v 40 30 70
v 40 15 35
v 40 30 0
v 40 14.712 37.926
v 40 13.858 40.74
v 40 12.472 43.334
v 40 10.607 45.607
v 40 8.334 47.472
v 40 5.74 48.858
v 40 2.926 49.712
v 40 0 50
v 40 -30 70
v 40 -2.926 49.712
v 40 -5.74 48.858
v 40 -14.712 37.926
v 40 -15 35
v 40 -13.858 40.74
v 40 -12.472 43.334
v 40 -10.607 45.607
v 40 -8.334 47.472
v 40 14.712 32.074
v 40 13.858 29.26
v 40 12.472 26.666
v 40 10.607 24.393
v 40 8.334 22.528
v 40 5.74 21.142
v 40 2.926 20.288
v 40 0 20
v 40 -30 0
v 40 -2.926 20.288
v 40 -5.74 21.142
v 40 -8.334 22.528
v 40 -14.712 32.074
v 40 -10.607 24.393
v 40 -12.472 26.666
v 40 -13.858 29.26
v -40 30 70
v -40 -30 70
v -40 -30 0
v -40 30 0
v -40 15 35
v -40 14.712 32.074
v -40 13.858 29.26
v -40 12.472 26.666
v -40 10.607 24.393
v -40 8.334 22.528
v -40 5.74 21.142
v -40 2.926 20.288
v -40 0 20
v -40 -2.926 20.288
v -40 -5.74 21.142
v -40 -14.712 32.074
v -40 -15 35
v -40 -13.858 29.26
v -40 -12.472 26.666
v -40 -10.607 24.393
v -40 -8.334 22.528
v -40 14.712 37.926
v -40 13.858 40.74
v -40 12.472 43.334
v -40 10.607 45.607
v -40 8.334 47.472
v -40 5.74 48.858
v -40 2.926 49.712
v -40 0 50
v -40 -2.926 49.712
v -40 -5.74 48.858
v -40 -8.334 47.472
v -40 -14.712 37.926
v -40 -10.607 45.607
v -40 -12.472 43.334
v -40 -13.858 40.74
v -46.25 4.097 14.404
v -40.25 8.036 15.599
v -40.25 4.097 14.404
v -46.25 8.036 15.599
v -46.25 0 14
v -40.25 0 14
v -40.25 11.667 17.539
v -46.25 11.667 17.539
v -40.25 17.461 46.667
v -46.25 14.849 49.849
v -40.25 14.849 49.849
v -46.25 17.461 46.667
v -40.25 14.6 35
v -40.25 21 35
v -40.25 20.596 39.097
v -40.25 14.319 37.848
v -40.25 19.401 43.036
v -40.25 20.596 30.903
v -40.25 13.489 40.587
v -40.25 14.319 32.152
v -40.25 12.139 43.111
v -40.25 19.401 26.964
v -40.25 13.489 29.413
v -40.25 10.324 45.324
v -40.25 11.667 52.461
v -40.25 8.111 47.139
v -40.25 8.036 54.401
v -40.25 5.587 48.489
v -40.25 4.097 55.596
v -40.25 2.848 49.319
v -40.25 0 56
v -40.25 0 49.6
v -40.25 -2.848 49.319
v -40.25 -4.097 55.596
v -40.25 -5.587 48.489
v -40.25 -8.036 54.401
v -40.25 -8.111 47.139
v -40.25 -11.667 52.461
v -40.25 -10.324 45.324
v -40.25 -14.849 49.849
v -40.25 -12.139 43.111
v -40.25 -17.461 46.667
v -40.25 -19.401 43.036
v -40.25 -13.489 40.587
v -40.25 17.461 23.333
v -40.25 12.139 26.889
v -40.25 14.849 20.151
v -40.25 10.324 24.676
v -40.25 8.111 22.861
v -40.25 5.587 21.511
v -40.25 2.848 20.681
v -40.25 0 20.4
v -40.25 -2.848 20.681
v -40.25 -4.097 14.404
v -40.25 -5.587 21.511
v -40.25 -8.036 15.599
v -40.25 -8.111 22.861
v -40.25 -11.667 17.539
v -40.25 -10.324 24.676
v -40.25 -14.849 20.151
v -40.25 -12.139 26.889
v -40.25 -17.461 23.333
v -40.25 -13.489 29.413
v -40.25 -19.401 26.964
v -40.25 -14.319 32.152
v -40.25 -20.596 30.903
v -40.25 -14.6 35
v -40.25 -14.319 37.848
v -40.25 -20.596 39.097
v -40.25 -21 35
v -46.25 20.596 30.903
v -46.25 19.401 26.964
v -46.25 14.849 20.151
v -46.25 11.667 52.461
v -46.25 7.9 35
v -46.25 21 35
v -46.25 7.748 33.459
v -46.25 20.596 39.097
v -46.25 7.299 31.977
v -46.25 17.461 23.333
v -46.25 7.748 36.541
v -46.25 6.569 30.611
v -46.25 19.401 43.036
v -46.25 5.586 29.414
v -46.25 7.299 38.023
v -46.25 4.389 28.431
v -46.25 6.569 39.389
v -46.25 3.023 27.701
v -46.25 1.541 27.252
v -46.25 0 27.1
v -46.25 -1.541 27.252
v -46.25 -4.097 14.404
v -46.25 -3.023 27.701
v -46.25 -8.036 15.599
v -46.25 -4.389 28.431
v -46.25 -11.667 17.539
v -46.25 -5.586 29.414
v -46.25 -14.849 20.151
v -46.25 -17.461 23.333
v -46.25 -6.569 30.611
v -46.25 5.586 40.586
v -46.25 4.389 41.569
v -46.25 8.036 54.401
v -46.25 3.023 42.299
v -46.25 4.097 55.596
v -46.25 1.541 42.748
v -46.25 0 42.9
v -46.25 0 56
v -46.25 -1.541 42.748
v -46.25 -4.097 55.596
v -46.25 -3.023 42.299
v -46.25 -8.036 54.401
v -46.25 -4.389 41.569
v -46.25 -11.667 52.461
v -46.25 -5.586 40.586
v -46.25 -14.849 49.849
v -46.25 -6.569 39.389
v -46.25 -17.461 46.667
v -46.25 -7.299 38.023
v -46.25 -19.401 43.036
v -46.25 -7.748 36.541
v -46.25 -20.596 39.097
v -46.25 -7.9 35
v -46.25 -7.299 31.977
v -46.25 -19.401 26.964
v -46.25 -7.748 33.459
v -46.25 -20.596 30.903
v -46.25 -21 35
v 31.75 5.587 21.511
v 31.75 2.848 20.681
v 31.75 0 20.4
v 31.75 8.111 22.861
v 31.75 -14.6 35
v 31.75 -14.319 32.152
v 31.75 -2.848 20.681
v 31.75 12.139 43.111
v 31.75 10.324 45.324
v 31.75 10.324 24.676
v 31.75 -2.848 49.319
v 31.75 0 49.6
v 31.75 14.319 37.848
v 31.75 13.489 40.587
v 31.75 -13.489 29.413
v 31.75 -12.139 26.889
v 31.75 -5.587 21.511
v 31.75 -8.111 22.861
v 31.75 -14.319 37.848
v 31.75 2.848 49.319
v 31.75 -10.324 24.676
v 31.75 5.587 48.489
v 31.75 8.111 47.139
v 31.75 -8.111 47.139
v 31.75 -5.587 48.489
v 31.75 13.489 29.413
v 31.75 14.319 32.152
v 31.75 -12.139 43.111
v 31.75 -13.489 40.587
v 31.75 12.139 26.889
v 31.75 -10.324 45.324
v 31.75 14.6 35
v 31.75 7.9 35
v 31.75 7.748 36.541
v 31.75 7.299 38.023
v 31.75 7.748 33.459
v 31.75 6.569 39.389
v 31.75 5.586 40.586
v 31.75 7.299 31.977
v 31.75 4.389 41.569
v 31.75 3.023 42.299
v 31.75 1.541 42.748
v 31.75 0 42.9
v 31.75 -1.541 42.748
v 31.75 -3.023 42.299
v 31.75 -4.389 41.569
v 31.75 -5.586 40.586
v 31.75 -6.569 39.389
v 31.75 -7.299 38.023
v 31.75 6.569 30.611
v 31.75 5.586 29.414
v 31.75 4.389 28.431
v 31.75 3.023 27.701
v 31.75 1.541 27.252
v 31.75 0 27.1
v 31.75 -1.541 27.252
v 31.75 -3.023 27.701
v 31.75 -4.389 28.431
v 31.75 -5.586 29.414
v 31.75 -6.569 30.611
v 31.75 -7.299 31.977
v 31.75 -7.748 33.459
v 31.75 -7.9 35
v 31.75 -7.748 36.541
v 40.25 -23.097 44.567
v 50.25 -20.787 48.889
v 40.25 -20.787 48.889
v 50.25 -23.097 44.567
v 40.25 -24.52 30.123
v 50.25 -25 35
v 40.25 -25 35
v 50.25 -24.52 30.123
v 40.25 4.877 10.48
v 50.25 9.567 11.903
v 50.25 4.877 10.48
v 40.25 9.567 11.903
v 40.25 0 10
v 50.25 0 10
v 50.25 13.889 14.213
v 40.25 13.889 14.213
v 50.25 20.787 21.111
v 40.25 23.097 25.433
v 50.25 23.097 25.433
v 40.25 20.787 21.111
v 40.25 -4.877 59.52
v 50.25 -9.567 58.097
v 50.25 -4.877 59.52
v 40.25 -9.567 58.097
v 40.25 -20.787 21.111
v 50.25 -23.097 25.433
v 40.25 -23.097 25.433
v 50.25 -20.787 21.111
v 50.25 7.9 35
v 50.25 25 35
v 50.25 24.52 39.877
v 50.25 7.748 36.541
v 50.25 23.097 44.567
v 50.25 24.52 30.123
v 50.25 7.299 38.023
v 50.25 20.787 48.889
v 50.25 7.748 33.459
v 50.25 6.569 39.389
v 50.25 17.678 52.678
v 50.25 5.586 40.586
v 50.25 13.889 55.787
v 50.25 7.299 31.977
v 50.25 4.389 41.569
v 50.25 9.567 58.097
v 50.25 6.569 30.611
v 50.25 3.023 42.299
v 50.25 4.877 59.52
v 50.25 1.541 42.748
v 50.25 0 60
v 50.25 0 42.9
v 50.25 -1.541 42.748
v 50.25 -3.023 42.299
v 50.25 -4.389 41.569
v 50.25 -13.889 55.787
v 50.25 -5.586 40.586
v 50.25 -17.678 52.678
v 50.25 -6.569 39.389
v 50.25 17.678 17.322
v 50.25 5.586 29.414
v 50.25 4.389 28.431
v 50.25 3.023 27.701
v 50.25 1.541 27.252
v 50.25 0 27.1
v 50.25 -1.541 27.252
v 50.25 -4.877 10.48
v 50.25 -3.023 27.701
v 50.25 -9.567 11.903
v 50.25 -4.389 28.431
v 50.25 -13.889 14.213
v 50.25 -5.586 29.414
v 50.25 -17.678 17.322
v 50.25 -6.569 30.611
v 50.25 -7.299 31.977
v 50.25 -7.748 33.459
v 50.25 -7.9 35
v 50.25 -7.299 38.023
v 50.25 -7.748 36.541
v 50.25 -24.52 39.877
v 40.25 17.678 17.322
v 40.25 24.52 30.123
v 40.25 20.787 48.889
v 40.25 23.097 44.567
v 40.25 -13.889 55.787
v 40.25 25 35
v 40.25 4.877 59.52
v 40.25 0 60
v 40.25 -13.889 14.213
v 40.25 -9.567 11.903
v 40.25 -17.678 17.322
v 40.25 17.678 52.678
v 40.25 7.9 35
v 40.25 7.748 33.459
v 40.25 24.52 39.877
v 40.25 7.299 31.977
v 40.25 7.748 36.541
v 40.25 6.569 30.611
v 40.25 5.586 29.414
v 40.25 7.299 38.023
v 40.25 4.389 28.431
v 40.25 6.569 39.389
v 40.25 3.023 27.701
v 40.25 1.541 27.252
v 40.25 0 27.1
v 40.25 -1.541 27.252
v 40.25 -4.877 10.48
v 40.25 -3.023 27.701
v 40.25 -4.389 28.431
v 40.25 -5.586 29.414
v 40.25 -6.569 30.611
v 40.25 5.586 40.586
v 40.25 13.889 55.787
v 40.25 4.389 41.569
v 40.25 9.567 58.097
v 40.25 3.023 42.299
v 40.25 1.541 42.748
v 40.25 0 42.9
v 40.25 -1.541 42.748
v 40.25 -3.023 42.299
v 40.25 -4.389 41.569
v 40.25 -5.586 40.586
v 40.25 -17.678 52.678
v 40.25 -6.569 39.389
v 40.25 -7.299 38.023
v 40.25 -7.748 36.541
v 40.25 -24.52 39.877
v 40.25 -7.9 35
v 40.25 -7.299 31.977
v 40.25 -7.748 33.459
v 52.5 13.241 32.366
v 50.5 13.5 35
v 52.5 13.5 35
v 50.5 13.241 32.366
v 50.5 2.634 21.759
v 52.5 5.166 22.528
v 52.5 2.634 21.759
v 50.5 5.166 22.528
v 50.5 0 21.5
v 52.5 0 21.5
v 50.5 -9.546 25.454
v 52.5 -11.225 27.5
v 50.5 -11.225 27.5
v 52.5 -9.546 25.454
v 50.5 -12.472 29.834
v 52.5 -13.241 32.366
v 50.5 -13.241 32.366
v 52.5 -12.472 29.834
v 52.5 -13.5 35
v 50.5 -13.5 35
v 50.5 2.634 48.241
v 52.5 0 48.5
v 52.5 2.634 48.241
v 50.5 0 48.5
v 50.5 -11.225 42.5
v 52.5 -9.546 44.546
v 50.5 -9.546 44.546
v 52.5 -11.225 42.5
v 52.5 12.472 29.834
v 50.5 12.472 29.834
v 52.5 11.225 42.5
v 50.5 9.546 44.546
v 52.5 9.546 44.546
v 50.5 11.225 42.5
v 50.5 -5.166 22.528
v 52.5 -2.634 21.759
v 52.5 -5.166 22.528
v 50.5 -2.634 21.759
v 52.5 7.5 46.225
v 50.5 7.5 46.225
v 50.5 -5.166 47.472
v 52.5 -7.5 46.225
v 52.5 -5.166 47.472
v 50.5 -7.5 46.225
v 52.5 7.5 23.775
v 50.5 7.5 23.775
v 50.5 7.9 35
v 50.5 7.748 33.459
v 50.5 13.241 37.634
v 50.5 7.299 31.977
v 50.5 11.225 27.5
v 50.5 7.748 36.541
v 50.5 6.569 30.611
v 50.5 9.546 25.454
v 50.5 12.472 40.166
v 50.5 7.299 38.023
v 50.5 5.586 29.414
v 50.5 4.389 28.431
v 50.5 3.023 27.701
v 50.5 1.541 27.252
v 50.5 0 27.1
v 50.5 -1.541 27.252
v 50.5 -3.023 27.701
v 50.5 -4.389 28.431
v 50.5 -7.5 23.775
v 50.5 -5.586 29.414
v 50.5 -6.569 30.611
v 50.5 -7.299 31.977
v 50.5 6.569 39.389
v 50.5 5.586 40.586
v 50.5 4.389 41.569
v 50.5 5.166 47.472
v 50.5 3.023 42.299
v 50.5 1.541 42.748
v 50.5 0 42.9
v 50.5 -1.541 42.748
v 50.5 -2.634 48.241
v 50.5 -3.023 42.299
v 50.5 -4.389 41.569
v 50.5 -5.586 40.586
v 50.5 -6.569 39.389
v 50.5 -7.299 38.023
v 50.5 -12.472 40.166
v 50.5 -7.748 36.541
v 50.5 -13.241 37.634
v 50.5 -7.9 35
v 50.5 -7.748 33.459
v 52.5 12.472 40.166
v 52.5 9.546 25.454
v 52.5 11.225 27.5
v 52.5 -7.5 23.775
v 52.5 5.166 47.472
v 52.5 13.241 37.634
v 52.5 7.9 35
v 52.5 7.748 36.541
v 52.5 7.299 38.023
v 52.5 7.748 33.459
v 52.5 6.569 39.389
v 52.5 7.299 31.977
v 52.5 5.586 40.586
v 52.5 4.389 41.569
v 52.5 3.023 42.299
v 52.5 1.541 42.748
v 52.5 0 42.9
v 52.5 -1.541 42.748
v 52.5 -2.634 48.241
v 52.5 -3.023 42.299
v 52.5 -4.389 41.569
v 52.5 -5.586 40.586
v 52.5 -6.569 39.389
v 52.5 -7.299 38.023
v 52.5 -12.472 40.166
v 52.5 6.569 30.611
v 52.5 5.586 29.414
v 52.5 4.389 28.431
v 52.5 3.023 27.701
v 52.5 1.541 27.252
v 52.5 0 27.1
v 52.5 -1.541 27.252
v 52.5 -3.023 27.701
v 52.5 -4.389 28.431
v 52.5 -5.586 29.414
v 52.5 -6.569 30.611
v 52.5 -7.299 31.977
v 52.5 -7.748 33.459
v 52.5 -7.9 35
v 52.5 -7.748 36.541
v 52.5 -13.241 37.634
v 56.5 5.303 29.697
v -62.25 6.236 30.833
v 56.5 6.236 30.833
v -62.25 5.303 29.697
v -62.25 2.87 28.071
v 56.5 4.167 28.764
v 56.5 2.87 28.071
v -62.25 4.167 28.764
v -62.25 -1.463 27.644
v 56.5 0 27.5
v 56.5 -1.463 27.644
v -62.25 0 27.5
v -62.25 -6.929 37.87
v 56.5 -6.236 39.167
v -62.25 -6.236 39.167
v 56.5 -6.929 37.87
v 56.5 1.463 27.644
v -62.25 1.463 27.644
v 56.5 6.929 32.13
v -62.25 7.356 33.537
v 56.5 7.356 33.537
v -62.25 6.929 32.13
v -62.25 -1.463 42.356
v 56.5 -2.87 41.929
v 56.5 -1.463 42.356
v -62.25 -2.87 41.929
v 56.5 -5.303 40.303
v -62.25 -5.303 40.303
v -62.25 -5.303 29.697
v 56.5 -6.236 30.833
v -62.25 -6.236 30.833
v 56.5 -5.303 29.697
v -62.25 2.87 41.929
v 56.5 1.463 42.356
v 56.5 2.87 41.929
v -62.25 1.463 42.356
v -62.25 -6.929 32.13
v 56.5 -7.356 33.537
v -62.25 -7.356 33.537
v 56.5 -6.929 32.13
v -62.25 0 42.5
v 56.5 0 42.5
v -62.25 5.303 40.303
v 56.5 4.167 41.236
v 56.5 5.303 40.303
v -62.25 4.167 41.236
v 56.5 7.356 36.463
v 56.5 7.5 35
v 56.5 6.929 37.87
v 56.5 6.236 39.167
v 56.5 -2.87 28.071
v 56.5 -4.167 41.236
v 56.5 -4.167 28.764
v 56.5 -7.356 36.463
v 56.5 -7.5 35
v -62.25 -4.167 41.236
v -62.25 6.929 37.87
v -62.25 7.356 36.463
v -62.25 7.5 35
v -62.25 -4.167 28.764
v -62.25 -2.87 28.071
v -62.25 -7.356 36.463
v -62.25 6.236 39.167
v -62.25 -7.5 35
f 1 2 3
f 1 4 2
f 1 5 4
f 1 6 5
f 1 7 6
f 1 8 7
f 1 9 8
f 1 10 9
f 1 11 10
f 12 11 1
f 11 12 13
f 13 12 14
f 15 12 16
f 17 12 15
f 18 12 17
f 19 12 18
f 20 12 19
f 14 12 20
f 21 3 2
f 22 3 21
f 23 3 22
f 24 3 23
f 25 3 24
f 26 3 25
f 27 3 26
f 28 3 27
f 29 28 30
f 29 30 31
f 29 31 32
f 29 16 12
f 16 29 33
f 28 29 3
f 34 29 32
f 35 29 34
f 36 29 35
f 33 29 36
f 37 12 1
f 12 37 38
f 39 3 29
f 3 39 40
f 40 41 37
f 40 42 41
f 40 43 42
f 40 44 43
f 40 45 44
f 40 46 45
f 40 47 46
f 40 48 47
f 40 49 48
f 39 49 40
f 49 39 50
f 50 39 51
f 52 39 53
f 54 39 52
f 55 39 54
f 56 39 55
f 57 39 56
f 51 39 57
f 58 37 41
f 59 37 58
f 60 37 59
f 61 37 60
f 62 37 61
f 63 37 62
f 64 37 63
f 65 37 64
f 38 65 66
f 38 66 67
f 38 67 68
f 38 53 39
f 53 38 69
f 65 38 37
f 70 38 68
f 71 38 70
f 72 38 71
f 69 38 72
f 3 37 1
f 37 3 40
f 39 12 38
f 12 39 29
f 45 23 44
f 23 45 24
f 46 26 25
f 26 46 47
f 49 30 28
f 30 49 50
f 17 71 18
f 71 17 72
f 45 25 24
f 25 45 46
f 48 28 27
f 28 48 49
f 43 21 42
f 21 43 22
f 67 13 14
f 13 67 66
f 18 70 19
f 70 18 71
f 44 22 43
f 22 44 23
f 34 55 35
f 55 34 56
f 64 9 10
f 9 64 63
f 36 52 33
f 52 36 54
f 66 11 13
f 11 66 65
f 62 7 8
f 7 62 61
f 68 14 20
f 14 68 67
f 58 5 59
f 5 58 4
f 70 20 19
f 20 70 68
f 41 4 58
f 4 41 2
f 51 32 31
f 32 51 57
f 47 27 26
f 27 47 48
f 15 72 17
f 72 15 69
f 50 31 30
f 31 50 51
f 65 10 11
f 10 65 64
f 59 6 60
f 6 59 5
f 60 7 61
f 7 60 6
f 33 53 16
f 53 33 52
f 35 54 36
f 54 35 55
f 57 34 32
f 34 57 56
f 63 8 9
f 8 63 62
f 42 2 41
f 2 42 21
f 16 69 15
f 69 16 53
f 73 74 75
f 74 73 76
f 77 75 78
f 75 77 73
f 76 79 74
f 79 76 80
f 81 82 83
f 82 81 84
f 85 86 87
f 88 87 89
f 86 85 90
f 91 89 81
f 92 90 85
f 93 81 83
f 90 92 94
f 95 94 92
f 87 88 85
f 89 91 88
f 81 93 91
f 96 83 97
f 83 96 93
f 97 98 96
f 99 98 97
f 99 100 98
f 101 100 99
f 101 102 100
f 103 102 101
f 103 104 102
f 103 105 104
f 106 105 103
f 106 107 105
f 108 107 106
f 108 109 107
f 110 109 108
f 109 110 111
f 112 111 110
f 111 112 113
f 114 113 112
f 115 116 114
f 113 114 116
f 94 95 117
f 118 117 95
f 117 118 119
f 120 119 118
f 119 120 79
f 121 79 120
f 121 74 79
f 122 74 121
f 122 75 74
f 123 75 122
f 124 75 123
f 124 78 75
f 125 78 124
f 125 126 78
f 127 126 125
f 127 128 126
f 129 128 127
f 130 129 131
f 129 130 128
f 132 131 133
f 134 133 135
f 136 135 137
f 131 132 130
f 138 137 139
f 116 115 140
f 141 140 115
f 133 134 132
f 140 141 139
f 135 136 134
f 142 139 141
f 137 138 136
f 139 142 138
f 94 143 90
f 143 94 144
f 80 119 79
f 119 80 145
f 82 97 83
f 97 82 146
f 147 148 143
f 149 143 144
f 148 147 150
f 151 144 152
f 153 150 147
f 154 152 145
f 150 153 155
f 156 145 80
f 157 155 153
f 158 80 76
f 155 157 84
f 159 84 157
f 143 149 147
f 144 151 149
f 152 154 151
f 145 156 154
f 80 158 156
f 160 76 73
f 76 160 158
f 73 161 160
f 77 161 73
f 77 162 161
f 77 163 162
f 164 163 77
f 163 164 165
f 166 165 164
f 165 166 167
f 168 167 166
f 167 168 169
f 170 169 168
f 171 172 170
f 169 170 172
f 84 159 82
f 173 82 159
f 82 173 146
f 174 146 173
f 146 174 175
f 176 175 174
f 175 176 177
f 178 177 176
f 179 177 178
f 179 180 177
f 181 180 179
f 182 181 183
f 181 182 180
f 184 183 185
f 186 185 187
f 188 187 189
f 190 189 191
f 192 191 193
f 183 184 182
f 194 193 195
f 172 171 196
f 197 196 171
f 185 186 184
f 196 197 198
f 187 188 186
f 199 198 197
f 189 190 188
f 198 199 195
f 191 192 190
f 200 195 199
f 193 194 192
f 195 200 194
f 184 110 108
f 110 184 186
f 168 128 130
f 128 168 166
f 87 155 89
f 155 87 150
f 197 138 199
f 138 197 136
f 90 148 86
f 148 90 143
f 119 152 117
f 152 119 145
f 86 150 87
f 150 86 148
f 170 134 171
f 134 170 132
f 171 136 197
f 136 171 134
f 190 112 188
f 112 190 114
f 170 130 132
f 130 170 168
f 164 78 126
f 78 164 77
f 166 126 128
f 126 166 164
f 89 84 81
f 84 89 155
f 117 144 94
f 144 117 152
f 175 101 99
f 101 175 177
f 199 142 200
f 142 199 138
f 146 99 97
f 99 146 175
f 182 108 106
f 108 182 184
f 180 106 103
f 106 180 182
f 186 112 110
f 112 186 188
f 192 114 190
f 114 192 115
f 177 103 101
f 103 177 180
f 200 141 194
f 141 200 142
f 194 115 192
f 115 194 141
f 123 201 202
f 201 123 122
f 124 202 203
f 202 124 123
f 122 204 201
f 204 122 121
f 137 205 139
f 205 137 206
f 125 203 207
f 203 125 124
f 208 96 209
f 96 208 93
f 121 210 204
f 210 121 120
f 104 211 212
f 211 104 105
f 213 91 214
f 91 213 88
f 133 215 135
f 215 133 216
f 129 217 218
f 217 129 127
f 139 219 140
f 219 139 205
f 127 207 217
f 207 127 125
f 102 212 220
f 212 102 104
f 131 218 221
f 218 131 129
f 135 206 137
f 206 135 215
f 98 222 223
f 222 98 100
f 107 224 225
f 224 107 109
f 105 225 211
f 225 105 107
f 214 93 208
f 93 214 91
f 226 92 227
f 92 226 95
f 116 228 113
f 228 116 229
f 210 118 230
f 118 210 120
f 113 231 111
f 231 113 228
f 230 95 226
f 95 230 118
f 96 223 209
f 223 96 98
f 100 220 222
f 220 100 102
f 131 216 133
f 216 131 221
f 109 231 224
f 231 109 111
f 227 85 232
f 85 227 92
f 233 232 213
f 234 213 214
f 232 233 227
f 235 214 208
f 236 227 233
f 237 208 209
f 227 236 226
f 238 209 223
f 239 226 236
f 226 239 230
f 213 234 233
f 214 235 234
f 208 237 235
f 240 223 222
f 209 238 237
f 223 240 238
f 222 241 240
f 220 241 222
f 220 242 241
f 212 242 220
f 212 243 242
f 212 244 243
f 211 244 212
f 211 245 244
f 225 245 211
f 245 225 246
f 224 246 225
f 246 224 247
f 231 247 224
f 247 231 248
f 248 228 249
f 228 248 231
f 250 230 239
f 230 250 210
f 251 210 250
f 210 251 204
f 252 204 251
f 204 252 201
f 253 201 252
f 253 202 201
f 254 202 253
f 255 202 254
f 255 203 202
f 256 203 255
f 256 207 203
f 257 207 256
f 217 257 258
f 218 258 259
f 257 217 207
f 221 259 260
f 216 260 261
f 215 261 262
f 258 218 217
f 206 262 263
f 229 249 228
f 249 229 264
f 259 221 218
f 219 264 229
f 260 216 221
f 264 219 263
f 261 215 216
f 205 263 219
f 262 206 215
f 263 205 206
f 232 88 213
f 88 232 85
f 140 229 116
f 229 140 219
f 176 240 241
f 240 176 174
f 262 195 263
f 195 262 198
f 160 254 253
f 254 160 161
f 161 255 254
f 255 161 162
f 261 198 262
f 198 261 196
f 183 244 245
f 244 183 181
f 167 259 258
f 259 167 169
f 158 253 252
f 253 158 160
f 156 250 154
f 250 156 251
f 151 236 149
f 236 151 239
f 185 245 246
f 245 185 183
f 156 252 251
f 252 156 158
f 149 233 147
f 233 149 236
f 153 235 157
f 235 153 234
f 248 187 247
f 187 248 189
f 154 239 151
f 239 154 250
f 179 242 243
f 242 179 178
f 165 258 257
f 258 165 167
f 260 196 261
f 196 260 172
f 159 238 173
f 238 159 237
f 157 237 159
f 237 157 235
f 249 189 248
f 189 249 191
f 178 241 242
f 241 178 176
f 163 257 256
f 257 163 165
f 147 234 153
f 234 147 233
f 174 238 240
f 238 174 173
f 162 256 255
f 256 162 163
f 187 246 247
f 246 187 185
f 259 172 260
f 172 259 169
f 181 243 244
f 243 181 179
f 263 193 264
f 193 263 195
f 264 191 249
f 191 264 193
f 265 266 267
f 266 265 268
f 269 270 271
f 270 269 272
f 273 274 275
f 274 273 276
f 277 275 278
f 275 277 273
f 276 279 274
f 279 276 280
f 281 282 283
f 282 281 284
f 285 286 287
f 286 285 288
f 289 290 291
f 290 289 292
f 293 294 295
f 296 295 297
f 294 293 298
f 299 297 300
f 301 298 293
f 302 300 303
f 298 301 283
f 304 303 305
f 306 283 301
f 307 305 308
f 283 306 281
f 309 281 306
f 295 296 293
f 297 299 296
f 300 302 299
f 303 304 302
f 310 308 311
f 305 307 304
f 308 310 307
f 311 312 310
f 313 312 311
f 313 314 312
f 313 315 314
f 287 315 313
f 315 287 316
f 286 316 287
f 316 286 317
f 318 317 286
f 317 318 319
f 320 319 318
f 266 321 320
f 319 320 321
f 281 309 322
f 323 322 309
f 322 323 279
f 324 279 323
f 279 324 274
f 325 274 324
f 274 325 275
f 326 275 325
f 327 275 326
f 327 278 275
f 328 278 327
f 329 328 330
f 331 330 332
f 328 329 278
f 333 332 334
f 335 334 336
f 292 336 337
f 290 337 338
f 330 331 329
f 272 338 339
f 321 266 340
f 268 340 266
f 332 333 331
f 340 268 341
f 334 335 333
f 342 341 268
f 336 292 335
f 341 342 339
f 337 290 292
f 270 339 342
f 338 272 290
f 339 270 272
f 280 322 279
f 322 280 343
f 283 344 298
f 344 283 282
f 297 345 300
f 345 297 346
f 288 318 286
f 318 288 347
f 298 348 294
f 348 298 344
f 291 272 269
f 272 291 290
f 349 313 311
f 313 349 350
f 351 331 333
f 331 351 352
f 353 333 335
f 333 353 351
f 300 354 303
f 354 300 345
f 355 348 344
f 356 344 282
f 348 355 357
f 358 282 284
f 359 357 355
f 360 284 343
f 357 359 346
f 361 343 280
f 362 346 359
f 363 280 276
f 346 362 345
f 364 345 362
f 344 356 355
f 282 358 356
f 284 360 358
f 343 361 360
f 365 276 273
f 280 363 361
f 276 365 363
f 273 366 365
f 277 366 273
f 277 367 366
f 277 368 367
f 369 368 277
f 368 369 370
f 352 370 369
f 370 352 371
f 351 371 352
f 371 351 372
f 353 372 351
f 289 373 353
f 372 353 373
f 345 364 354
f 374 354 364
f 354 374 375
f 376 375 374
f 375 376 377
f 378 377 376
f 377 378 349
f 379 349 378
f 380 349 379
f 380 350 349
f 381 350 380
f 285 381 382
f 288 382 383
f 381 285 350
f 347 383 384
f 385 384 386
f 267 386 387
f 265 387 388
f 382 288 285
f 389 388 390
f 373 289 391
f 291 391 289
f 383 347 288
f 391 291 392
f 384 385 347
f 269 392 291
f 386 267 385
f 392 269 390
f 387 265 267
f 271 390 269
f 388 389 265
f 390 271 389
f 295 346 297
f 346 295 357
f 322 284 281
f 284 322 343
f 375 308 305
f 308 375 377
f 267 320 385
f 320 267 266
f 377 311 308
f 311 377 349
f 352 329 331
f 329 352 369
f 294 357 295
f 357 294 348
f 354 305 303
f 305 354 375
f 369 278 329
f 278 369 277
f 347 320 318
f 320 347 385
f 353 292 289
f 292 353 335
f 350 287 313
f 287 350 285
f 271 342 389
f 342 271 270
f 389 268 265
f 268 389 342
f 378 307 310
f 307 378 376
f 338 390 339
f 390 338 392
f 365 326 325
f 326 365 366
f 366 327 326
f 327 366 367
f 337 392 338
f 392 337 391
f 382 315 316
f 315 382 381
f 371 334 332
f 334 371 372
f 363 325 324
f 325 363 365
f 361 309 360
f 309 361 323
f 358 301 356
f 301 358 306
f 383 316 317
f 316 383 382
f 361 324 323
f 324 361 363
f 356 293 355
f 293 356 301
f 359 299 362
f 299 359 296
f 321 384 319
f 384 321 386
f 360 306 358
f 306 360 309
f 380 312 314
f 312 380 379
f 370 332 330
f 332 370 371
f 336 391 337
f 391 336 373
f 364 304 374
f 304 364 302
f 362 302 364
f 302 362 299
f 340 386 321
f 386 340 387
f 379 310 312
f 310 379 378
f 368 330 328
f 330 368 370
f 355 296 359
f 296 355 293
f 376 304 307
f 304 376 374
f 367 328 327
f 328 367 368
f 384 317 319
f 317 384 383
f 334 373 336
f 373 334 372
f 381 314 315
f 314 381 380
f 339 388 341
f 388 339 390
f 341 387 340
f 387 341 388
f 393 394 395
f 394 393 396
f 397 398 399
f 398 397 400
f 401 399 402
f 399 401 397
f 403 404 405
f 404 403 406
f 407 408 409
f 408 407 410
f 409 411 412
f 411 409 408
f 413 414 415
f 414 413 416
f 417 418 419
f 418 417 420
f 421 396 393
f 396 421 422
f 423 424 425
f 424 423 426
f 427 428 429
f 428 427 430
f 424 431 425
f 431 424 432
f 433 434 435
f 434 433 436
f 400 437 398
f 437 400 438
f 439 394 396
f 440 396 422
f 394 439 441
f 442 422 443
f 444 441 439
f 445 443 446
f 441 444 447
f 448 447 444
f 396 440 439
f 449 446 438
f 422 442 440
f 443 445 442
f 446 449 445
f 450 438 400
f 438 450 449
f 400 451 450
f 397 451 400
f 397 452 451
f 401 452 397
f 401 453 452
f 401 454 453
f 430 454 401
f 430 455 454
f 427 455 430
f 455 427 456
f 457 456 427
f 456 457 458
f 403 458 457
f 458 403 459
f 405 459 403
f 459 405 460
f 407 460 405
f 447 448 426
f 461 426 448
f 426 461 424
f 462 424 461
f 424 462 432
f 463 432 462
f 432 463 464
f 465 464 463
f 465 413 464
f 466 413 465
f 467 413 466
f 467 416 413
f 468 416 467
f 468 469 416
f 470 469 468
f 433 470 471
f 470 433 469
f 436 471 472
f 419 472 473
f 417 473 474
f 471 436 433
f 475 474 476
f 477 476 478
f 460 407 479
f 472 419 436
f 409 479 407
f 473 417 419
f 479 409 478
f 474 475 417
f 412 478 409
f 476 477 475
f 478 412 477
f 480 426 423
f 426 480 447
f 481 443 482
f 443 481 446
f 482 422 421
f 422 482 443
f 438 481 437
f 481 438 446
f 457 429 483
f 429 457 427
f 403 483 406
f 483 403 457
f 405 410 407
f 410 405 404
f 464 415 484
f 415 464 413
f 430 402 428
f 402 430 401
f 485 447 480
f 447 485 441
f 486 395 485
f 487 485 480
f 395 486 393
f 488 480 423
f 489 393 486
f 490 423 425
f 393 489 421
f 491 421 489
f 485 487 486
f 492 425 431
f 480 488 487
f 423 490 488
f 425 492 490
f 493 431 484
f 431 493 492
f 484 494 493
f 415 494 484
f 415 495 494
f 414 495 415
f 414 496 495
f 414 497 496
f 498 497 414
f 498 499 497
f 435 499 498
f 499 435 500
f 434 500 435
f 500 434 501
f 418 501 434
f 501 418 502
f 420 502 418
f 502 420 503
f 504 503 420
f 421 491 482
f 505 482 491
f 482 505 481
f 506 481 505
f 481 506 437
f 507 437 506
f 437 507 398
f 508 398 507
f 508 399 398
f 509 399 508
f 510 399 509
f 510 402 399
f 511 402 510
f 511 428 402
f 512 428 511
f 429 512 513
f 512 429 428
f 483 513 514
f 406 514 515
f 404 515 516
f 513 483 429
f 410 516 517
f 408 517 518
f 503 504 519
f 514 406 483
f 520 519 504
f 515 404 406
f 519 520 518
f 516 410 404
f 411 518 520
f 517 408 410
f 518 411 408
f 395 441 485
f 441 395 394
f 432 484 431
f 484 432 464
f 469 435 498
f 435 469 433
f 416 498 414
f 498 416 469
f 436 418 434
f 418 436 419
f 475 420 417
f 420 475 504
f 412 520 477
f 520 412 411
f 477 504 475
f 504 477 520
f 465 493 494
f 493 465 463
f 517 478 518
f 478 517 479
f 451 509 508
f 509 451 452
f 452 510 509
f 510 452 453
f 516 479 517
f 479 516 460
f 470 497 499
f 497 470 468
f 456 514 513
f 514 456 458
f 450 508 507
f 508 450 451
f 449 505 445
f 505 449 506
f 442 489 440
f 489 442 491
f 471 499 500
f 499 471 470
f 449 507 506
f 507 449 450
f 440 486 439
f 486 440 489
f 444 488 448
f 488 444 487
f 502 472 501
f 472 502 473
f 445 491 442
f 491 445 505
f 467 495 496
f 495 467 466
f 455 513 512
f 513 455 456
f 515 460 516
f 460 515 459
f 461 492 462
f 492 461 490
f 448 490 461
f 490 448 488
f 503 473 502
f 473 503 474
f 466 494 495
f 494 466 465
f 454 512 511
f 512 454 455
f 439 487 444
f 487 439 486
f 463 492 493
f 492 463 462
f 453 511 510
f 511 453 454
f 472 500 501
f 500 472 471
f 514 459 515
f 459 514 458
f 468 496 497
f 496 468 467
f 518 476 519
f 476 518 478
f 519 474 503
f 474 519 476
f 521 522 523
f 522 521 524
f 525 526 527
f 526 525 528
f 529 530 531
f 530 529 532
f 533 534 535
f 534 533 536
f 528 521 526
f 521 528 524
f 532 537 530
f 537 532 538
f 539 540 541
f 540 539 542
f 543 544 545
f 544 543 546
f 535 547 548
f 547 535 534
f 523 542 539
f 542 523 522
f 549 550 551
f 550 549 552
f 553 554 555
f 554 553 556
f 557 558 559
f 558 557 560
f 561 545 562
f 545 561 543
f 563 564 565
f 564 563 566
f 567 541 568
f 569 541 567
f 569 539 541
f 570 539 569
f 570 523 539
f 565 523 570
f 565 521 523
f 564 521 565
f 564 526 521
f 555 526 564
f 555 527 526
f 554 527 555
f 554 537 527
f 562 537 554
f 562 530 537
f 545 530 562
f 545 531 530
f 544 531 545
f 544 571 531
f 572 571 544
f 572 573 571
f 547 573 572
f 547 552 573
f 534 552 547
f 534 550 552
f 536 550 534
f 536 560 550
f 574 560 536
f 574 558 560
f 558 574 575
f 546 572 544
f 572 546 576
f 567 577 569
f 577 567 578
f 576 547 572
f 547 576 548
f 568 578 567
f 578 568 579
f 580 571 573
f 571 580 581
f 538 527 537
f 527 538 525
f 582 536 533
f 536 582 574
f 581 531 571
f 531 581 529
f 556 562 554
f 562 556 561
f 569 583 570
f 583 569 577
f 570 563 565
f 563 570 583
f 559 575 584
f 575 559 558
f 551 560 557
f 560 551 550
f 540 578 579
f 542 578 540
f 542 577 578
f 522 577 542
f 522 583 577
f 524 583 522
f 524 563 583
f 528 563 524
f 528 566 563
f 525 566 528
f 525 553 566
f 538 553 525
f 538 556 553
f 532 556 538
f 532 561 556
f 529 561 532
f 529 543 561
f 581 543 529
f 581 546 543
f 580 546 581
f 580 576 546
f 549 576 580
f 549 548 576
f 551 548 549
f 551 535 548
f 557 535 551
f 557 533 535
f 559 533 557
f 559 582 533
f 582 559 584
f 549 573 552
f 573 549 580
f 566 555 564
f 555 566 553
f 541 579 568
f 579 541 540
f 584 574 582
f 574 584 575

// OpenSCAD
$fn = 32;

// ------------------------------------------------------------------------
// Bushed housing: 80 x 60 x 70 mm housing, bushing d29.2
// Every part is its own module, assembly() places them once.
// ------------------------------------------------------------------------

// --- part 1 ---
module housing() {
  difference() {
    translate([-40, -30, 0]) cube([80, 60, 70]);
    translate([0, 0, 35]) rotate([0, 90, 0]) cylinder(h = 82, d = 30, center = true);
  }
}

// --- part 2 ---
module bushing() {
  difference() {
    union() {
      cylinder(h = 6, d = 42);
      translate([0, 0, 6]) cylinder(h = 72, d = 29.2);
    }
    translate([0, 0, -1]) cylinder(h = 80, d = 15.8);
  }
}

// --- part 3 ---
module shaft() {
  translate([0, 0, -59.375]) cylinder(h = 118.75, d = 15);
}

// --- part 4 ---
module cover() {
  difference() {
    cylinder(h = 10, d = 50);
    translate([0, 0, -1]) cylinder(h = 12, d = 15.8);
  }
}

// --- part 5 ---
module washer() {
  difference() {
      translate([0, 0, 0]) cylinder(h = 2, d = 27);
      translate([0, 0, -1]) cylinder(h = 4, d = 15.8);
    }
}

// --- assembly ---
module assembly() {
  translate([0, 0, 0]) rotate([0, 0, 0]) housing();
  translate([-46.25, 0, 35]) rotate([0, 90, 0]) bushing();
  translate([-2.875, 0, 35]) rotate([0, 90, 0]) shaft();
  translate([40.25, 0, 35]) rotate([0, 90, 0]) cover();
  translate([50.5, 0, 35]) rotate([0, 90, 0]) washer();
}

assembly();
